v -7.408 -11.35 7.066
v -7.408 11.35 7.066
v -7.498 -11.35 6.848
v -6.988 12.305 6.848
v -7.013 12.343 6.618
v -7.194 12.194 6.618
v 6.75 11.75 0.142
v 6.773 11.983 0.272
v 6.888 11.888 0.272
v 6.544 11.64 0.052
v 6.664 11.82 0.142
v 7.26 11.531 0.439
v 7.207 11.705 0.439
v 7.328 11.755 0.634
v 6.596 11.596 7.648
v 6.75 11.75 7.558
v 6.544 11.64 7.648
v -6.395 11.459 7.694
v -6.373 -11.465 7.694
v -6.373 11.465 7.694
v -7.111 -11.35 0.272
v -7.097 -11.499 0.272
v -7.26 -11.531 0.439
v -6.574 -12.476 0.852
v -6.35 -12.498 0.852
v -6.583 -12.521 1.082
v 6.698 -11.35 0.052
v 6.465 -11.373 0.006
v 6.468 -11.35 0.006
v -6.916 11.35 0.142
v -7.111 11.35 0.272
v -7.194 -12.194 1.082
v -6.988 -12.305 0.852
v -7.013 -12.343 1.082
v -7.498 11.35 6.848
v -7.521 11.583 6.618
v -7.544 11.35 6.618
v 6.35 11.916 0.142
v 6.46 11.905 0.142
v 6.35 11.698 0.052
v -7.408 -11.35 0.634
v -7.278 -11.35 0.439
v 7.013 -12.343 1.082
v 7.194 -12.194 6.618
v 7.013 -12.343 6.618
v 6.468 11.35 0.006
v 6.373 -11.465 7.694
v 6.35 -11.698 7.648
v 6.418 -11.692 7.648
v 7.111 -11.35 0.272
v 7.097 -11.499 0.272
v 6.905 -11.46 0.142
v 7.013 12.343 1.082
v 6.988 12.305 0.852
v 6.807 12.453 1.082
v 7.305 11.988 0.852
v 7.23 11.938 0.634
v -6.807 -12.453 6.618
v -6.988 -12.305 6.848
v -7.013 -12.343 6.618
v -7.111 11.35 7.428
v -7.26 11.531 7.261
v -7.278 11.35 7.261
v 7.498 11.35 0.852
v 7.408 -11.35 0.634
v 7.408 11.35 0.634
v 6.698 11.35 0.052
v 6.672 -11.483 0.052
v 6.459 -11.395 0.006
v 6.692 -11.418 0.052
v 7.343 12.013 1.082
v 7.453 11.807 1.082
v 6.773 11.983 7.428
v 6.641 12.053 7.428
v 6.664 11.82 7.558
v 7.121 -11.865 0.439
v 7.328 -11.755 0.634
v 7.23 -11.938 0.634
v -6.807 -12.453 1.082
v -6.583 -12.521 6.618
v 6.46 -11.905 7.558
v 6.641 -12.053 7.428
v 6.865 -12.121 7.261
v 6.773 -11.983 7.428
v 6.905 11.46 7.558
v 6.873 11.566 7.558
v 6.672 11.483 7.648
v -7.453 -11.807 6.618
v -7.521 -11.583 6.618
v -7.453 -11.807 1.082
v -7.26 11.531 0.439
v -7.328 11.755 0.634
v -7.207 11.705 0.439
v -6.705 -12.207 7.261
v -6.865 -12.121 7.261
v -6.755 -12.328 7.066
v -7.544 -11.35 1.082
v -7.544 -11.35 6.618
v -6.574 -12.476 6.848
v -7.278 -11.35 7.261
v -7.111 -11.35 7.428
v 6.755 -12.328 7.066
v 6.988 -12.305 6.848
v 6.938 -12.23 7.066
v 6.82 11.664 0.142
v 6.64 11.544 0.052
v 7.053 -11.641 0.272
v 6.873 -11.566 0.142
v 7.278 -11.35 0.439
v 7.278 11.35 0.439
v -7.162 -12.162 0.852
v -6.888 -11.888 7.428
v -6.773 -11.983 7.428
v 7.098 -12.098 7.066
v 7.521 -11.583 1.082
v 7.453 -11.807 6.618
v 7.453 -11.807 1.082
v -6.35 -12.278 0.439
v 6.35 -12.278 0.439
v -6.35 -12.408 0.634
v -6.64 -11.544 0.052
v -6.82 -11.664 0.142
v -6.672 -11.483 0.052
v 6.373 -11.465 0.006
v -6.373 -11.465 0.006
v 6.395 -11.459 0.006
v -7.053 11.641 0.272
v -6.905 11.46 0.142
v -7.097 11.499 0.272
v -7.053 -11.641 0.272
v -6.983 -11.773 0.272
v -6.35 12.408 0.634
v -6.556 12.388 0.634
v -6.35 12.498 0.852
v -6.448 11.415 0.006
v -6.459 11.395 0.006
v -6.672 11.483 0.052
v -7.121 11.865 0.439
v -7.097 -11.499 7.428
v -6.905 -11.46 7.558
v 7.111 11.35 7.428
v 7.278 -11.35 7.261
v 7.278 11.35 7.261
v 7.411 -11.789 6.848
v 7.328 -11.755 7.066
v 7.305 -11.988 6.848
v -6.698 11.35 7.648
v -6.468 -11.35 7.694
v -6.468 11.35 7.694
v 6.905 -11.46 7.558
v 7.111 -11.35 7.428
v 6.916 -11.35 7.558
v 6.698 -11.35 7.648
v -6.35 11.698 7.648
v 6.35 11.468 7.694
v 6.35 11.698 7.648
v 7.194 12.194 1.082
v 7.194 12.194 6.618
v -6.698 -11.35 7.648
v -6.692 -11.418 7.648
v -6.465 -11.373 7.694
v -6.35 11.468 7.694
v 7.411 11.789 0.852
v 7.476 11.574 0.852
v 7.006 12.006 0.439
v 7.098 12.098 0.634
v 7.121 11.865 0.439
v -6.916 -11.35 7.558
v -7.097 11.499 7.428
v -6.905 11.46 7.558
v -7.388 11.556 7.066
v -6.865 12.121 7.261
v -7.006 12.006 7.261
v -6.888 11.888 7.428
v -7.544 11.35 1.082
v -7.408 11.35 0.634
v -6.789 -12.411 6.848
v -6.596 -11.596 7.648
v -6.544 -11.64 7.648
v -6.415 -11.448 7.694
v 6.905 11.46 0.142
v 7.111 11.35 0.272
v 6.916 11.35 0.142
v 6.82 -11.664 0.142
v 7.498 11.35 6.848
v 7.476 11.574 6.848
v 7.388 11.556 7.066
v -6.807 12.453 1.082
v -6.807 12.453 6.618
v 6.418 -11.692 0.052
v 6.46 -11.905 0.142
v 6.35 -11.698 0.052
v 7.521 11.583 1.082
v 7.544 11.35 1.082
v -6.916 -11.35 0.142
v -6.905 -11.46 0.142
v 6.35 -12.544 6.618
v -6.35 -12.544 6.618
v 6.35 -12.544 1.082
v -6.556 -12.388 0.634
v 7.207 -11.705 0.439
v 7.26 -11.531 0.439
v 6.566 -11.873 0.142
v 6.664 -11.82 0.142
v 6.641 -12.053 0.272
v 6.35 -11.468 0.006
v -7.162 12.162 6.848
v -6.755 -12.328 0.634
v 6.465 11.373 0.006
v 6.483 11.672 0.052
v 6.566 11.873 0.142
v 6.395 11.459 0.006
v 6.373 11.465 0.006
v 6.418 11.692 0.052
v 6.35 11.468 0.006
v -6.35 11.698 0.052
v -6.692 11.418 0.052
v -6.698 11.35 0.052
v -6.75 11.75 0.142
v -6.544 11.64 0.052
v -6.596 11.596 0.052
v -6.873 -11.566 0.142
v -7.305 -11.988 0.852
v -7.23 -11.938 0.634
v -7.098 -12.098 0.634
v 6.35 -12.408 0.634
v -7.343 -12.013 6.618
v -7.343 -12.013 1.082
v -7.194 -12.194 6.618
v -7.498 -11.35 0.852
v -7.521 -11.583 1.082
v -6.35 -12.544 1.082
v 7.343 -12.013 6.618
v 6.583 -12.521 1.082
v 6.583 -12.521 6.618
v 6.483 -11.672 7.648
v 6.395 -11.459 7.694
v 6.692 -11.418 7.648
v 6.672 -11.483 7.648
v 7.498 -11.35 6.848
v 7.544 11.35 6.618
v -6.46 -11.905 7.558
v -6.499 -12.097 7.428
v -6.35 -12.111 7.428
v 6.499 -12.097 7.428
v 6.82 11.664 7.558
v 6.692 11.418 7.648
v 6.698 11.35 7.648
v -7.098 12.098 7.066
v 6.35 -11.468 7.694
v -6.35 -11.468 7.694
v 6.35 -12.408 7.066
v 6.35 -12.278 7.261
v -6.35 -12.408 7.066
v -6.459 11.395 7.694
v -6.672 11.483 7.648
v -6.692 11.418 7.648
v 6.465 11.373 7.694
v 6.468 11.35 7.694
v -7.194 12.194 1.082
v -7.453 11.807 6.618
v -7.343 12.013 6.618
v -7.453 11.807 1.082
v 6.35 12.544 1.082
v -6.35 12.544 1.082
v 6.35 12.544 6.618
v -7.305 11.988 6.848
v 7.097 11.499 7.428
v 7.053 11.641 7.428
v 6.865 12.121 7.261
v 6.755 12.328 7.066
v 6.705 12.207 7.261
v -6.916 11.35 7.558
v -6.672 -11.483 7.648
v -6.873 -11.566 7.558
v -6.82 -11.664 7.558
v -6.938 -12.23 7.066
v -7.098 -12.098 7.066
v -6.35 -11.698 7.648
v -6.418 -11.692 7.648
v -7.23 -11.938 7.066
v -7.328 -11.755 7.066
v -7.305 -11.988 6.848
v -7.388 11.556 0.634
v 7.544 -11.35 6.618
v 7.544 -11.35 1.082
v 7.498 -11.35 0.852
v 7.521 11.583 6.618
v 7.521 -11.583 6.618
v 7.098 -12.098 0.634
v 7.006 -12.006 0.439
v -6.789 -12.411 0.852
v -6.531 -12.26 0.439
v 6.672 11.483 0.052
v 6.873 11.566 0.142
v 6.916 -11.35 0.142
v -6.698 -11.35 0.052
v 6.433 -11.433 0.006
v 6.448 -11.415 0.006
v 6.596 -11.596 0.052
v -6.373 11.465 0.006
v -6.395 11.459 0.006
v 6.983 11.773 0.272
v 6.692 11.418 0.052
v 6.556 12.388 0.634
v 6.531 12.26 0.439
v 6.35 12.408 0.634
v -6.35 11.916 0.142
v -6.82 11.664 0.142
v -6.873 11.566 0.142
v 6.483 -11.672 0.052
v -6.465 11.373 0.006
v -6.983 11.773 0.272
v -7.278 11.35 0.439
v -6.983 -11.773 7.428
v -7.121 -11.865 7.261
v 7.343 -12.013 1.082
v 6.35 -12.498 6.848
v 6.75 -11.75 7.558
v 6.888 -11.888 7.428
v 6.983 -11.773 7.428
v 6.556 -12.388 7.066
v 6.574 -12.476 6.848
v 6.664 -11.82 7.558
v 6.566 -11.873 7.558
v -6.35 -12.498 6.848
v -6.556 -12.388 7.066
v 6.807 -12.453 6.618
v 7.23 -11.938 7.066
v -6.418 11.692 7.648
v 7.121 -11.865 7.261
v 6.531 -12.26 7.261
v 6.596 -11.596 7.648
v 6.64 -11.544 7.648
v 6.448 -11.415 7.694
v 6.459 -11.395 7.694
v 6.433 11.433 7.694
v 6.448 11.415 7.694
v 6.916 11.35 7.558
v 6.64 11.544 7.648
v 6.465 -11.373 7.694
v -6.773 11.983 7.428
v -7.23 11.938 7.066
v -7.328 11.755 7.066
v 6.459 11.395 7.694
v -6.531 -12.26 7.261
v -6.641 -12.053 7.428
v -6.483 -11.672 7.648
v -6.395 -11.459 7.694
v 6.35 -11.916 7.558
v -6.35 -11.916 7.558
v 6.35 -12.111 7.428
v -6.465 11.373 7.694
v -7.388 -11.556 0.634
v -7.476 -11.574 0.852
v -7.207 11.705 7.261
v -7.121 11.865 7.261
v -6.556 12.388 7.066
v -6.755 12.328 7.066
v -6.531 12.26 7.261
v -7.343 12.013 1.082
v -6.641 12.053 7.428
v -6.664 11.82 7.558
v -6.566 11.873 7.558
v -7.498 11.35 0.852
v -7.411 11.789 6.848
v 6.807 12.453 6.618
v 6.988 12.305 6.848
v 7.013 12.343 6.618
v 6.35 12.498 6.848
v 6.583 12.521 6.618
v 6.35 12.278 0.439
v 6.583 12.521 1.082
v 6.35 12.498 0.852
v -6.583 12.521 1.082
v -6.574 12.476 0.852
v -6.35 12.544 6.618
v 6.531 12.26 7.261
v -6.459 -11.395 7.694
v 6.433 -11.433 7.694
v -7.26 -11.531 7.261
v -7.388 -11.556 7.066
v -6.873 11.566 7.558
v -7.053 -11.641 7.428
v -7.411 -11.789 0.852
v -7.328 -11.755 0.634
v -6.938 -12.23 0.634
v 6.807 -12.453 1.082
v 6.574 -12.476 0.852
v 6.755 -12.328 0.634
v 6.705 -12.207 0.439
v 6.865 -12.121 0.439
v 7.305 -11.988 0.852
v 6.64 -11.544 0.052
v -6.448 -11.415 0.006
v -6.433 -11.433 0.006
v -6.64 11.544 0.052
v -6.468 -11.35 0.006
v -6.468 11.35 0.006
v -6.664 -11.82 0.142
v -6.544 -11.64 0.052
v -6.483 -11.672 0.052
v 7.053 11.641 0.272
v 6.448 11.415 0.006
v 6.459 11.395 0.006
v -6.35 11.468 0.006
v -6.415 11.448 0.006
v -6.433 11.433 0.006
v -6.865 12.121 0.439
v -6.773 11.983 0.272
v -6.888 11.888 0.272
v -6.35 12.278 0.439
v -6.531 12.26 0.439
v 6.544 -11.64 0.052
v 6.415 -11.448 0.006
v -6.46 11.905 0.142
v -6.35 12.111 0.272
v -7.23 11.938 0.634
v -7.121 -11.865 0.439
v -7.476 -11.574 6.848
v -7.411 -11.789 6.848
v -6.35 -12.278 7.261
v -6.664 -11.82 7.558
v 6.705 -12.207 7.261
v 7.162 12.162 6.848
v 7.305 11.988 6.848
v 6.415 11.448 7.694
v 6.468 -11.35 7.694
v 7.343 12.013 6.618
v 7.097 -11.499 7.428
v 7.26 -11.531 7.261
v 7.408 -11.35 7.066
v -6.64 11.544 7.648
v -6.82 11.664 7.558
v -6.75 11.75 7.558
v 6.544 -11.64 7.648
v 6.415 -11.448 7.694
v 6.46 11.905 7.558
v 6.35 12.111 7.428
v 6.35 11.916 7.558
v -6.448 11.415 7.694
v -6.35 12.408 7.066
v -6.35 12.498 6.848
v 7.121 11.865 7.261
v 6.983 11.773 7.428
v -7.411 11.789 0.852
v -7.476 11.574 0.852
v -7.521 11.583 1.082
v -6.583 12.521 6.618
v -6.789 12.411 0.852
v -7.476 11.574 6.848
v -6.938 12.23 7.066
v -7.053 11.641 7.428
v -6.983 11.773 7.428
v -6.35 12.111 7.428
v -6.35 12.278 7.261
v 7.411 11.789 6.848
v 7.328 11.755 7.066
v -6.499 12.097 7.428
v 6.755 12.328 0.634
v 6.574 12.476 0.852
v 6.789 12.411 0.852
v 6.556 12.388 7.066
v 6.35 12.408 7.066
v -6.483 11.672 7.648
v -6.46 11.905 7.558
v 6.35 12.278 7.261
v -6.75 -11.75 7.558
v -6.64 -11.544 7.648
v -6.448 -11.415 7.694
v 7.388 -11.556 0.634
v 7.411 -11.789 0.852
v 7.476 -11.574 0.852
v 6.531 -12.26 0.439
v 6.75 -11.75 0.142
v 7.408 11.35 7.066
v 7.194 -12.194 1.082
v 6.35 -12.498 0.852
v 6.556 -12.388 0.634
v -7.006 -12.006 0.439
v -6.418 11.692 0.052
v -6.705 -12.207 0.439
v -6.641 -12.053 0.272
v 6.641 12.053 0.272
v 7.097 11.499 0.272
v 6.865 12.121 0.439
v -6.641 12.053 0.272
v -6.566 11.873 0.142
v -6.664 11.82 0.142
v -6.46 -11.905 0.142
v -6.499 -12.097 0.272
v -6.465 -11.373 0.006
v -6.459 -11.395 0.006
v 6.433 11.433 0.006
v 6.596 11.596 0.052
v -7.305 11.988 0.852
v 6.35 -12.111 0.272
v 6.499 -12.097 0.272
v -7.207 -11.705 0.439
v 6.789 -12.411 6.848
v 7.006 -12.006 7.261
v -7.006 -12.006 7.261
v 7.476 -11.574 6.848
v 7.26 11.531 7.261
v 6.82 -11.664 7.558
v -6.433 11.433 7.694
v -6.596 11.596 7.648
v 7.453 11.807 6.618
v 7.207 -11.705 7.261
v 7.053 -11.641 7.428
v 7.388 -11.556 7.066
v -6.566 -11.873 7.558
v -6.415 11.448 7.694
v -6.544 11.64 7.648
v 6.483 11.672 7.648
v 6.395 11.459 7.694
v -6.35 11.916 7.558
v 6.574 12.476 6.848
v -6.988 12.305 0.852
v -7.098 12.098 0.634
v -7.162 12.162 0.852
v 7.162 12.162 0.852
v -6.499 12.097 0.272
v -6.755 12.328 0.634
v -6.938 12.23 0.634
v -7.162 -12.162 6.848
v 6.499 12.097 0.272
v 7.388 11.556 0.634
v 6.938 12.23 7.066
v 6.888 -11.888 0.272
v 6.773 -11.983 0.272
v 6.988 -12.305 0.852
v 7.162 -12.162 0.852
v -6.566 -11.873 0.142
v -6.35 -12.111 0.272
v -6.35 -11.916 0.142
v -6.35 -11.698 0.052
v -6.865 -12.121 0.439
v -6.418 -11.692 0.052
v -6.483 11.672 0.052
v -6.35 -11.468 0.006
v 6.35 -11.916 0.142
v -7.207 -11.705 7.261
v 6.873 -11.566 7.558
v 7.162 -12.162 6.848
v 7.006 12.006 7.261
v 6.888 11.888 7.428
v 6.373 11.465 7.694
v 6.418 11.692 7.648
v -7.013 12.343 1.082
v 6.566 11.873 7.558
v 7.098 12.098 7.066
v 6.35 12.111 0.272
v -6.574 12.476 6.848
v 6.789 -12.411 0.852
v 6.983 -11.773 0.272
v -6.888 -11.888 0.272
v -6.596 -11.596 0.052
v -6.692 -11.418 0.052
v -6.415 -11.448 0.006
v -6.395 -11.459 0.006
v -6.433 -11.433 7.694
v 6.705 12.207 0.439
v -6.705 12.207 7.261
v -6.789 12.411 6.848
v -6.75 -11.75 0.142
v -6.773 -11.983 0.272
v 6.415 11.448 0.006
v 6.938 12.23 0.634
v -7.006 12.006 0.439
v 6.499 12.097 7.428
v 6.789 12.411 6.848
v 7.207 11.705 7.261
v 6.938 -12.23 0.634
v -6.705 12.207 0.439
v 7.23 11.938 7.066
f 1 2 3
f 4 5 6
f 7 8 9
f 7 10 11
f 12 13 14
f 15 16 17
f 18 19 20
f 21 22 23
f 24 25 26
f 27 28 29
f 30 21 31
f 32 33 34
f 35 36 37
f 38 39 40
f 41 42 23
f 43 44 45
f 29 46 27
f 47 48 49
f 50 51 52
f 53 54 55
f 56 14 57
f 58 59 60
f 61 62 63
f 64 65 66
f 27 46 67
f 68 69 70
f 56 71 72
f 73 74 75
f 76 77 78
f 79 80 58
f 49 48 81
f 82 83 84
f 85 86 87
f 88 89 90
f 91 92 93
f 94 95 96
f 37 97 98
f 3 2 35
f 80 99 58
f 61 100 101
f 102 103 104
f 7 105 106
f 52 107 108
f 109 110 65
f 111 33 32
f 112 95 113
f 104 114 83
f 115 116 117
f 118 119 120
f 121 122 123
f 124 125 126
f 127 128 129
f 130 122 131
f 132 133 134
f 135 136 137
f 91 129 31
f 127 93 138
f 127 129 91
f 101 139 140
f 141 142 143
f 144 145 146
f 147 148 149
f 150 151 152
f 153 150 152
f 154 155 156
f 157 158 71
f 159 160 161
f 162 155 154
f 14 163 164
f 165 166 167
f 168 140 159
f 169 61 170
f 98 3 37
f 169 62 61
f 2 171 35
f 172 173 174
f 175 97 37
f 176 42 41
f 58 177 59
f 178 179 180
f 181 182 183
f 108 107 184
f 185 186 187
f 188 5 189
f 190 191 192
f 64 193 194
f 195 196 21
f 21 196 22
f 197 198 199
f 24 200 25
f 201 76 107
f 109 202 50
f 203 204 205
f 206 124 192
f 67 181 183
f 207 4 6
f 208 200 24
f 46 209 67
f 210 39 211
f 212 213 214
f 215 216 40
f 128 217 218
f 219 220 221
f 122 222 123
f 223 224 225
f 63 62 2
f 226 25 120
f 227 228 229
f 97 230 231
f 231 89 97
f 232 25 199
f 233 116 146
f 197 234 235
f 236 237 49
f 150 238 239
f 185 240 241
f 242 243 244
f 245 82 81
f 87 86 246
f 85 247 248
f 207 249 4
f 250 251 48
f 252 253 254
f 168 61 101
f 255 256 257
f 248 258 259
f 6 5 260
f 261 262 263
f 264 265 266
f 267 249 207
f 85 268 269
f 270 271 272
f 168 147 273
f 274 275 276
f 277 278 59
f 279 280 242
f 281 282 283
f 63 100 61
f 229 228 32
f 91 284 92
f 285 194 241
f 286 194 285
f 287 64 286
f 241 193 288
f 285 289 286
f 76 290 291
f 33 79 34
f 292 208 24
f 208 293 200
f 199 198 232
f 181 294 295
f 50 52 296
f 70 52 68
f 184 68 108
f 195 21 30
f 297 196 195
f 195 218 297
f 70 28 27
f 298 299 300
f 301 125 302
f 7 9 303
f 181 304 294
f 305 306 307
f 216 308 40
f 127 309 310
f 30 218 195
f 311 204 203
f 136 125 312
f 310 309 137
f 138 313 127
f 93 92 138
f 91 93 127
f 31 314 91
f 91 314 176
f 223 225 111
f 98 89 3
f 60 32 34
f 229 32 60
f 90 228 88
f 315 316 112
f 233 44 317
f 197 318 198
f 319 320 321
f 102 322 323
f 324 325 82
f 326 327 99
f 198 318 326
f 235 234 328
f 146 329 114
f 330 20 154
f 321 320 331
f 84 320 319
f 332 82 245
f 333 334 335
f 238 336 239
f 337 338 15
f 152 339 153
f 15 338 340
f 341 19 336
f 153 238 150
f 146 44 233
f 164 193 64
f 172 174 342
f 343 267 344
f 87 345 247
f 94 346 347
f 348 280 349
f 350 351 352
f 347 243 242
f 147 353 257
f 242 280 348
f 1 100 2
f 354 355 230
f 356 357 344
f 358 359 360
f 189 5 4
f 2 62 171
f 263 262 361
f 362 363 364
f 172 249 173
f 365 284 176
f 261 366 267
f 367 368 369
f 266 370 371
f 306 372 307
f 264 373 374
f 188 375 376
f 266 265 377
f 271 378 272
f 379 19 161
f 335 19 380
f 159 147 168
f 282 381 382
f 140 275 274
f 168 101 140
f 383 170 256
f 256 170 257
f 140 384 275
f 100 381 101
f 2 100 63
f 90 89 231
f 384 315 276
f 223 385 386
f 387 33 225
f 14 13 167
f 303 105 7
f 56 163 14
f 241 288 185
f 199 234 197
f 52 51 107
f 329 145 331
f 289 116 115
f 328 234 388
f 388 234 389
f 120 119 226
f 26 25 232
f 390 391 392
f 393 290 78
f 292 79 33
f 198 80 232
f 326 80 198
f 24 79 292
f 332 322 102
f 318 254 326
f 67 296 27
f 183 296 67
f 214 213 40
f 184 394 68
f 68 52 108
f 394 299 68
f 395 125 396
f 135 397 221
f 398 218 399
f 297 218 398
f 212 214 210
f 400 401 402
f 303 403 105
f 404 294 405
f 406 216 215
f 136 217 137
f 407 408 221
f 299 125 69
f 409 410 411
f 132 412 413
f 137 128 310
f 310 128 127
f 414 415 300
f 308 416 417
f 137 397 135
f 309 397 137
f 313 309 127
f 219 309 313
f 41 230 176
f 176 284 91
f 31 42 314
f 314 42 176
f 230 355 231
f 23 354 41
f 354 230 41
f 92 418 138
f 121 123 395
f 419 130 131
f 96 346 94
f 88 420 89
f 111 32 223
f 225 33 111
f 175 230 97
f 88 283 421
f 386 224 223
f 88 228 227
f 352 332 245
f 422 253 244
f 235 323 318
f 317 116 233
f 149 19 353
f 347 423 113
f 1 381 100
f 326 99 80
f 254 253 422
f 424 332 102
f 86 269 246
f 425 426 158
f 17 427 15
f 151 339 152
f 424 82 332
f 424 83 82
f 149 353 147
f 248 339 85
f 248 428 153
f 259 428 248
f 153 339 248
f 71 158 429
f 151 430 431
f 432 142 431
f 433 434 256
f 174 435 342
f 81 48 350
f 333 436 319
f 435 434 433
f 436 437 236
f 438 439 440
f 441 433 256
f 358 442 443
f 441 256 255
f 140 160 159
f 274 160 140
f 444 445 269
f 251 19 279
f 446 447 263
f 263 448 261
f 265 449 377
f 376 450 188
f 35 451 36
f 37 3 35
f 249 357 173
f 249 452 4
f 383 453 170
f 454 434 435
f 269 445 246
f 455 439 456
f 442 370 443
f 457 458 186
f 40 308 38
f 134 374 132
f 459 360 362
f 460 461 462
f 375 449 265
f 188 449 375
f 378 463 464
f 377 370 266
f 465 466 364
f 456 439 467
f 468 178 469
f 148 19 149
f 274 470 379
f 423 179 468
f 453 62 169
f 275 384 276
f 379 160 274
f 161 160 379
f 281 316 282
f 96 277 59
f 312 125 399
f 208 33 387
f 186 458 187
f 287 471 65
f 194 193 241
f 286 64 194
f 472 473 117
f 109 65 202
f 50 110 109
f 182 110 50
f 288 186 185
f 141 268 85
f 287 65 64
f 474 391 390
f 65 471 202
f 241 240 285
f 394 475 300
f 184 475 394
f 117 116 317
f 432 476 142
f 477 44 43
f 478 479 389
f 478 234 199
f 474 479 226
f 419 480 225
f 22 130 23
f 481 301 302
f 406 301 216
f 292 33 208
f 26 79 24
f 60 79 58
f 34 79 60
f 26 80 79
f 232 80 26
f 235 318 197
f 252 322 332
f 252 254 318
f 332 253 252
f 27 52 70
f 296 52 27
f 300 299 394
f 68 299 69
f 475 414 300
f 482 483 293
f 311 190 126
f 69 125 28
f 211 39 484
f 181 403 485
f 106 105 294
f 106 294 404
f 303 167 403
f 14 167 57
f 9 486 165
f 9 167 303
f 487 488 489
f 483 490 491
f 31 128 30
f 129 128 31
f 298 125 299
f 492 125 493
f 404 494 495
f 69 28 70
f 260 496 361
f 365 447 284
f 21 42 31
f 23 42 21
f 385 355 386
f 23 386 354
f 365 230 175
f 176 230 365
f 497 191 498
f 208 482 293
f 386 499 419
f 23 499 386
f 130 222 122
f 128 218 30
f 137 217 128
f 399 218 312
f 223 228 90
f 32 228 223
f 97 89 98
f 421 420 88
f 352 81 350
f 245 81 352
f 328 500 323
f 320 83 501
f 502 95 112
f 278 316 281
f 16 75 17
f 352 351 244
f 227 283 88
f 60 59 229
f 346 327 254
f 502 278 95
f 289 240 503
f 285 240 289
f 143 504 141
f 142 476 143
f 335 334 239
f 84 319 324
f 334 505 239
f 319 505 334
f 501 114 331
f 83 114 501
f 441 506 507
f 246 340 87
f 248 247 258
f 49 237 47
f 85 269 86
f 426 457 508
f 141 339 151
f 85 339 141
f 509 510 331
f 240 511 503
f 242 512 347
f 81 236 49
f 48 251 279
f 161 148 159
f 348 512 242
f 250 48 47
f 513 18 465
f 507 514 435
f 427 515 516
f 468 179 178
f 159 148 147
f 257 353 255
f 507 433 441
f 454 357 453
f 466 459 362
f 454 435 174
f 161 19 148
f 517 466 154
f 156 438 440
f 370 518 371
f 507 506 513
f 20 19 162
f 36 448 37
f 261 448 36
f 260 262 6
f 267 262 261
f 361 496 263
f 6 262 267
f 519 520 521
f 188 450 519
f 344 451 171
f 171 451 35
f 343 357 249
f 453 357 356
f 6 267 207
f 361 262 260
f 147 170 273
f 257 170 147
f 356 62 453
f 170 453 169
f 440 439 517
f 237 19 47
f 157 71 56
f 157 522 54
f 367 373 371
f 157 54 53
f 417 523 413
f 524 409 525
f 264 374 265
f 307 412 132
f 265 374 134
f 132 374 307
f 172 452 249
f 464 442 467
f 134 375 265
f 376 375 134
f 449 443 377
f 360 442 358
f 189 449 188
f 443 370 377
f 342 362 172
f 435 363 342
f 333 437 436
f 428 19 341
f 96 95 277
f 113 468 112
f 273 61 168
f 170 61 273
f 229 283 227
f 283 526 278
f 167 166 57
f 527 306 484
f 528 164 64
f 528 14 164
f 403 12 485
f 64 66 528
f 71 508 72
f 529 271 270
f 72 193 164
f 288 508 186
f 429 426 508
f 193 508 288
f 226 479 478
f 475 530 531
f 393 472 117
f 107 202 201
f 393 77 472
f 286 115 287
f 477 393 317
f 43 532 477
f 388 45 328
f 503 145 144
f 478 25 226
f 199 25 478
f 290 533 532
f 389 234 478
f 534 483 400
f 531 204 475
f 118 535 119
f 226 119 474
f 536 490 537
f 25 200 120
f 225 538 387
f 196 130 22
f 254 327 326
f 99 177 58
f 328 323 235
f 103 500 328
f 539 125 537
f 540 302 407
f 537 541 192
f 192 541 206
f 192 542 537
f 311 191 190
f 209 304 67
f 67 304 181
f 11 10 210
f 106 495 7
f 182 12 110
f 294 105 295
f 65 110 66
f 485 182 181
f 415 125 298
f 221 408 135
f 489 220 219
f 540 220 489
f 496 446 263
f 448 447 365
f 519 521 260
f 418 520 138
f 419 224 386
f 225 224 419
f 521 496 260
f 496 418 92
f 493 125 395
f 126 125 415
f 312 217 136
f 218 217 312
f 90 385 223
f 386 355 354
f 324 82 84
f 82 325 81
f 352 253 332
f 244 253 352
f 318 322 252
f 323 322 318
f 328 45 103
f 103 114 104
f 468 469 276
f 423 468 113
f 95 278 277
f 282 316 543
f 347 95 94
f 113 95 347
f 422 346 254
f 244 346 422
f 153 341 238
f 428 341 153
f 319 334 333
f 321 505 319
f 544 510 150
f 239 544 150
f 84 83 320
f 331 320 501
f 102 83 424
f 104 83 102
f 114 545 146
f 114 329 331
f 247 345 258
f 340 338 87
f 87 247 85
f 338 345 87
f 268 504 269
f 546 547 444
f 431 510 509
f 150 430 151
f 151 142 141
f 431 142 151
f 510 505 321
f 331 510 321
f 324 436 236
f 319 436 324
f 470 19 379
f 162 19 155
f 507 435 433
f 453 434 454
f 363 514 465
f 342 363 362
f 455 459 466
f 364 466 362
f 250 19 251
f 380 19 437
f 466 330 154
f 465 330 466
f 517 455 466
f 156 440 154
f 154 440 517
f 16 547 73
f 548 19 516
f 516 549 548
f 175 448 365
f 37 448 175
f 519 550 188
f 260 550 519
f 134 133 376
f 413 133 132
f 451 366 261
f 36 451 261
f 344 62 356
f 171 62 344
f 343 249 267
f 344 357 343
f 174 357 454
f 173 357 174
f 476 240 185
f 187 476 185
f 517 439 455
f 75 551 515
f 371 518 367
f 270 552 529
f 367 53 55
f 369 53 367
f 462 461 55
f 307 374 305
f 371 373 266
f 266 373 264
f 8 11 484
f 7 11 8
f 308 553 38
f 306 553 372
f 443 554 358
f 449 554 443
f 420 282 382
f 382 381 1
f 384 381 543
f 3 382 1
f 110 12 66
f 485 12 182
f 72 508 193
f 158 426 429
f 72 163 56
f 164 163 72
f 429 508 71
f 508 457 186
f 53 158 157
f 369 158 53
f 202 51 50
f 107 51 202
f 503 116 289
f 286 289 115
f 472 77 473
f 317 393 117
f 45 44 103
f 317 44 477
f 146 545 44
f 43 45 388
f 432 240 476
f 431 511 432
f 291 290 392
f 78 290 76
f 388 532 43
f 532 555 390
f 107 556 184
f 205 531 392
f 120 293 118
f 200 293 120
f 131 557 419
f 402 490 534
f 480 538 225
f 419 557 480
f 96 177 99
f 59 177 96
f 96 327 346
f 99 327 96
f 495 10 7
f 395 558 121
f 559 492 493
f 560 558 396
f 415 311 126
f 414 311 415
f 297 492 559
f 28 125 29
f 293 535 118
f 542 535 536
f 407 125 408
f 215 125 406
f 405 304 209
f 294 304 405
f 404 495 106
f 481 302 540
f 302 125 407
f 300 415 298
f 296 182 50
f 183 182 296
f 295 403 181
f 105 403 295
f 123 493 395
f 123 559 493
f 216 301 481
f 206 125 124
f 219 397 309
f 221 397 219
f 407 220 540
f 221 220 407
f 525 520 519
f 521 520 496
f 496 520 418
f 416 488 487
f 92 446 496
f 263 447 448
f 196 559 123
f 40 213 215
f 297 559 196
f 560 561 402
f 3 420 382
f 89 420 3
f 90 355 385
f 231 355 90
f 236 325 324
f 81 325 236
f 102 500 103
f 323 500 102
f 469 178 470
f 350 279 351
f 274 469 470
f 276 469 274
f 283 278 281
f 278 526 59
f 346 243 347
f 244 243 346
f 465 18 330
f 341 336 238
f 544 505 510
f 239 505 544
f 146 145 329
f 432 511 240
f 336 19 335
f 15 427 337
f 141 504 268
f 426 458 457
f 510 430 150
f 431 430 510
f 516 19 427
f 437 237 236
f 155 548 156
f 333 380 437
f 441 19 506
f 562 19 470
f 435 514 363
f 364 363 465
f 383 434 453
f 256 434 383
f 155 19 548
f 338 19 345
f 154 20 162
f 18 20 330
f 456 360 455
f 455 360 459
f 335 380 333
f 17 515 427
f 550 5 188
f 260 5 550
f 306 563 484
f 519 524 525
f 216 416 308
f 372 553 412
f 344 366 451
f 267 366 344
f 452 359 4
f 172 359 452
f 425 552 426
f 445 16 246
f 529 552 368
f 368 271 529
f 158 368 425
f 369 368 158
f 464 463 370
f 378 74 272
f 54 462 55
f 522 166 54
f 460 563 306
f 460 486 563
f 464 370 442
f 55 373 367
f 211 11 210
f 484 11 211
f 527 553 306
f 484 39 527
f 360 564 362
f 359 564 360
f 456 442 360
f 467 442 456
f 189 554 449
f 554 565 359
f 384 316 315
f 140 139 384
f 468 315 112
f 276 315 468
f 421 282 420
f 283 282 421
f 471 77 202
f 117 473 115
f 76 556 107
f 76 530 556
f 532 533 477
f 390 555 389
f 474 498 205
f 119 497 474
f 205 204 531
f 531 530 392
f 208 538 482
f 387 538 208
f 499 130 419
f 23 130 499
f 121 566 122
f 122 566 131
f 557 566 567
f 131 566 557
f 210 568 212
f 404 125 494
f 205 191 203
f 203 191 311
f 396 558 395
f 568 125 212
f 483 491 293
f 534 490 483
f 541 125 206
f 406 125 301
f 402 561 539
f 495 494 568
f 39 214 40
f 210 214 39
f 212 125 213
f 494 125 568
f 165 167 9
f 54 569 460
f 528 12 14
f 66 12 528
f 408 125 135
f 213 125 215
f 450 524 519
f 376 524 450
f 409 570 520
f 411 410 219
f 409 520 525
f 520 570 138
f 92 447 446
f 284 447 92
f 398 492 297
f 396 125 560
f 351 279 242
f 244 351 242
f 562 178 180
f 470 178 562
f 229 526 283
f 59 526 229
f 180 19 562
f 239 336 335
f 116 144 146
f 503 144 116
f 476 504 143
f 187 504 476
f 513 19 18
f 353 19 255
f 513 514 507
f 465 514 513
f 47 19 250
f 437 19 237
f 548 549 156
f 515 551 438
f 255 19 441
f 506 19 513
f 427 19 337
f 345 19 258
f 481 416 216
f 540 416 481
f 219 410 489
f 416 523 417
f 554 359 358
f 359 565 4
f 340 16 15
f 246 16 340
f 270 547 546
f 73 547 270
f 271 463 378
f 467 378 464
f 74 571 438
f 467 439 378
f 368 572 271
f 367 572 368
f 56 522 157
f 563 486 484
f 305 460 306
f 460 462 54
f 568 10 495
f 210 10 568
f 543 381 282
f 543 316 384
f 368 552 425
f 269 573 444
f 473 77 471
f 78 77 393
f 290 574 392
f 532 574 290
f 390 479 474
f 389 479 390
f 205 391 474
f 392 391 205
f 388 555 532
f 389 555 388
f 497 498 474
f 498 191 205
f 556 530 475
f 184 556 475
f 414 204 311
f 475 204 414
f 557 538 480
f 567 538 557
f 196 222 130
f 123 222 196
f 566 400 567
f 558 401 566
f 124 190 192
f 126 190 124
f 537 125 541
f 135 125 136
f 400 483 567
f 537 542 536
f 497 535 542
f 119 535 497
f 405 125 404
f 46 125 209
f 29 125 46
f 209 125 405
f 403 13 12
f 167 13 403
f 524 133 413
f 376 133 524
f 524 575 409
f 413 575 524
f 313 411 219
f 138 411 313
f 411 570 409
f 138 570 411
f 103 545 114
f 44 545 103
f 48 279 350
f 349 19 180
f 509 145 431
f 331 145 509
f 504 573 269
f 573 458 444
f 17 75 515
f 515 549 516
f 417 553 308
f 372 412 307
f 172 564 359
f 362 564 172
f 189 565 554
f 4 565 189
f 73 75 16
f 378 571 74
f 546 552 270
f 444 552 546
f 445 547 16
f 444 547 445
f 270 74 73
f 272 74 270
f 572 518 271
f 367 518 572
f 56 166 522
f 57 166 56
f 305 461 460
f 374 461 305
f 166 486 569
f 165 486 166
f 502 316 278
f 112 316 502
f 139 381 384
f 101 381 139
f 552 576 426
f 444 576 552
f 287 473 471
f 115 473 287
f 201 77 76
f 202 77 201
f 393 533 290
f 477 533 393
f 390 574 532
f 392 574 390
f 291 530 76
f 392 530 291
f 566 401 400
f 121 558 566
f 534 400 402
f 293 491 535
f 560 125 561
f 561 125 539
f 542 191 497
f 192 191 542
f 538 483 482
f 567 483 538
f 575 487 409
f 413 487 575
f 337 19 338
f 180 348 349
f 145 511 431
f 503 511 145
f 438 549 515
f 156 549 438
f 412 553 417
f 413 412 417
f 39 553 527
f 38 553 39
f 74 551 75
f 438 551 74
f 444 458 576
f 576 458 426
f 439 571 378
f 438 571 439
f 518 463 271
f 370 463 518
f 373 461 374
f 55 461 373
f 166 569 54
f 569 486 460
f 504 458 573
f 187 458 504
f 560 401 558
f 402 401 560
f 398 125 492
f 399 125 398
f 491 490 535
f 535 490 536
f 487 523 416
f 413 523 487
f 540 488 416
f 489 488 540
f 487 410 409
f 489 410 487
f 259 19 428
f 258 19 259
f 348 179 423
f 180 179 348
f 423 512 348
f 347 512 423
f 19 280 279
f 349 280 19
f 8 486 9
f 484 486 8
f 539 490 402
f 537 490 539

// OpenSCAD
// DHT22 (DHT22 溫濕度感測器) visual source for NexCAD.
// Units: millimeters. Origin: part bottom-center, matching src/parts/library.ts.
// This generated baseline is intentionally simple; refine it with measured details before exporting STL.

$fn = 32;

module rounded_box(size, r = 0.8) {
  hull() {
    for (x = [-size[0] / 2 + r, size[0] / 2 - r])
      for (y = [-size[1] / 2 + r, size[1] / 2 - r]) {
        translate([x, y, r]) sphere(r = r);
        translate([x, y, size[2] - r]) sphere(r = r);
      }
  }
}

color("#2e7d5b") rounded_box([15.1, 25.1, 7.7], min(1.2, min(15.1, 25.1) / 8));
